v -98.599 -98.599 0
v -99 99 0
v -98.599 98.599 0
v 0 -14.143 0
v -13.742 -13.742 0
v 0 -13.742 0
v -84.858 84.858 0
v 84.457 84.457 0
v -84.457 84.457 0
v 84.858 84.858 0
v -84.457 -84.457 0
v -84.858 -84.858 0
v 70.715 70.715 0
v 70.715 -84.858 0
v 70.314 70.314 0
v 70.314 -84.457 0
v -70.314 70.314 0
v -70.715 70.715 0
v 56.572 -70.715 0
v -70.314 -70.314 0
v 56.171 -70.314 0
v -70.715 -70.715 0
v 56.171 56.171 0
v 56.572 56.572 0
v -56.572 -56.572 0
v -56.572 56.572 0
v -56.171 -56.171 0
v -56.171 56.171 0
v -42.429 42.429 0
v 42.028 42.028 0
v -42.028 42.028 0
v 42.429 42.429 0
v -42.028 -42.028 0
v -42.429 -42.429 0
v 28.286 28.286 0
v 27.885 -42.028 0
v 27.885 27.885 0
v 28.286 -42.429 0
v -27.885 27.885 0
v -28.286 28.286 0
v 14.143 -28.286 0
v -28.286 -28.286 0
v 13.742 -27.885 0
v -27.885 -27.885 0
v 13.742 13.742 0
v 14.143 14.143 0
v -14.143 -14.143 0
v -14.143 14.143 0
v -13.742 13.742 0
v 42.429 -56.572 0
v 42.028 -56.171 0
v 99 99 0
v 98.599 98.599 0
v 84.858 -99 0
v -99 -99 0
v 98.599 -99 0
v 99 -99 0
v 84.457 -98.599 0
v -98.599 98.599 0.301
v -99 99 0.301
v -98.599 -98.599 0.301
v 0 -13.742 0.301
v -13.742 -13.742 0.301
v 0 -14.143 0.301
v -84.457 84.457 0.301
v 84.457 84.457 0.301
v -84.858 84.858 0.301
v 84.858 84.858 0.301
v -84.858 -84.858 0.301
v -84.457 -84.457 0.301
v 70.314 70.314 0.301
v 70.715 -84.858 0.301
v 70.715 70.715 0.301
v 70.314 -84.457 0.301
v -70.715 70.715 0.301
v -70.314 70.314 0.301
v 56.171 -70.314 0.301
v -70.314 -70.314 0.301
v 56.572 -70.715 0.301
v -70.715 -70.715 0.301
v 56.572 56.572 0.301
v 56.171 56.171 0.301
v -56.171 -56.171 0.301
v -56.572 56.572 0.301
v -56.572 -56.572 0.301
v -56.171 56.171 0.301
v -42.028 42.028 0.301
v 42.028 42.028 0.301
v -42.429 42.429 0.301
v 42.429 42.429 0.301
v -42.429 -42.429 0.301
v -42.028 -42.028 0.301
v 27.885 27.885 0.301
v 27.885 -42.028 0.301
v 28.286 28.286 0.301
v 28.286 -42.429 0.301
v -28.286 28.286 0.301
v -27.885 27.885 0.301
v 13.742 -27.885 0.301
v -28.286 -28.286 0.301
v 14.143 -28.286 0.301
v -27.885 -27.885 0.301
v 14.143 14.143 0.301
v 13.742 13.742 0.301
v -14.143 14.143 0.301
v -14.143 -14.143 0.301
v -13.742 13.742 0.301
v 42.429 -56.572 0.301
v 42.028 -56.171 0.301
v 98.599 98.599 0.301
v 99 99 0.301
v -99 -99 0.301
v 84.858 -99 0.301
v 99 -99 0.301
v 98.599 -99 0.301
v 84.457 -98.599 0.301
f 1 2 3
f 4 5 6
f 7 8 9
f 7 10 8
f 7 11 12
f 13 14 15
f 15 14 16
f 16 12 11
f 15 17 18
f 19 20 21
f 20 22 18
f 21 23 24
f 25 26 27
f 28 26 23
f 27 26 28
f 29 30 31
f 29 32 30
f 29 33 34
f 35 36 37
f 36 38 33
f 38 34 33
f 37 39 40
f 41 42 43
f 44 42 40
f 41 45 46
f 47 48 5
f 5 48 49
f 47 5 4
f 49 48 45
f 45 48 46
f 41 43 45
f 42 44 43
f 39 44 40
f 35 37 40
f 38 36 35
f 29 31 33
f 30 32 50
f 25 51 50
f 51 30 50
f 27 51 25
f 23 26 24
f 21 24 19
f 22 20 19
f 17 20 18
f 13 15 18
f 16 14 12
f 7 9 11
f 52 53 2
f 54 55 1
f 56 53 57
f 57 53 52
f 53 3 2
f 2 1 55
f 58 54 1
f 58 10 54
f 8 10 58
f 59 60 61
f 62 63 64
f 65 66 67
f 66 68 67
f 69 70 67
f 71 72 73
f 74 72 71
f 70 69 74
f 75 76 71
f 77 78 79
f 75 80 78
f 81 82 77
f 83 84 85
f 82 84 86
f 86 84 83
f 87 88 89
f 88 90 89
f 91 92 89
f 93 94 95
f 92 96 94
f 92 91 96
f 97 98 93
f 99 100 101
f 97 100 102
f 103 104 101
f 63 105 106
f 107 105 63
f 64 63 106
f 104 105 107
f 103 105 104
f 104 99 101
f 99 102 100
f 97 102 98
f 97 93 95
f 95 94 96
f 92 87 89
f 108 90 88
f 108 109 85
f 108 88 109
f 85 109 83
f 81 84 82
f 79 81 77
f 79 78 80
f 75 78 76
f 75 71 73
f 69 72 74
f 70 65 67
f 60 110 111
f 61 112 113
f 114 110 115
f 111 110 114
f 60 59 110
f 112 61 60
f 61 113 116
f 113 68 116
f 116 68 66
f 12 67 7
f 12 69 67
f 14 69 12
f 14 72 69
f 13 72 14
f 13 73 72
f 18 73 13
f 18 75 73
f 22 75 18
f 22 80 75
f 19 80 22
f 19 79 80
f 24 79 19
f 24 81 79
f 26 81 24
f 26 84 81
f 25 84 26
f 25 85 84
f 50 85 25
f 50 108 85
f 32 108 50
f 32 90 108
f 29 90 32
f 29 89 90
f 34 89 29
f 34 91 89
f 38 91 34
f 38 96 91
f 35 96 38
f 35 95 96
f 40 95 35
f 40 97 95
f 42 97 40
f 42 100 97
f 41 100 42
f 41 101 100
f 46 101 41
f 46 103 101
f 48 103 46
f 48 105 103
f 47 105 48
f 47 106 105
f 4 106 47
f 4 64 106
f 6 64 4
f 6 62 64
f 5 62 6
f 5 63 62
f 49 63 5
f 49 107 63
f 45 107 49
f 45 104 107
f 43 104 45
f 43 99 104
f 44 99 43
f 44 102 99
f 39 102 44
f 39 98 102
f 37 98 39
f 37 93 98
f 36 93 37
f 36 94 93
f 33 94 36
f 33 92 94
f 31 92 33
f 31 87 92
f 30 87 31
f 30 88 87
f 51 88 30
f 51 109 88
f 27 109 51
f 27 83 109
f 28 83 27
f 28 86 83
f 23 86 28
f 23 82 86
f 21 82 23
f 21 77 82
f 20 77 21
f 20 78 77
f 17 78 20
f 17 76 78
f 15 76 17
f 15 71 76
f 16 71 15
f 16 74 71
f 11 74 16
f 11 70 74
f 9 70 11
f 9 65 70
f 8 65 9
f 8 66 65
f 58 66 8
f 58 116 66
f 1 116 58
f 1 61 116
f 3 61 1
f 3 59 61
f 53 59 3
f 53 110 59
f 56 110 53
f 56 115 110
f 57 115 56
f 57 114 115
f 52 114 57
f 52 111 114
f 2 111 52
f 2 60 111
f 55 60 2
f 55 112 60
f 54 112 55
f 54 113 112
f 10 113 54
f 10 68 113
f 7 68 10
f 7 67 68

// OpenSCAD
// Spiral squares bed level pattern
// One continuous square spiral of seven turns across 90% of a 220 x 220 mm bed.

include <../../src/bedlevelpattern.scad>;

// Parameters
bed_level_pattern_type = "spiral squares";
print_area_width = 220.001;
print_area_depth = 220.001;
line_width = 0.401;
line_height = 0.301;
fill_percentage = 90; // Range: [50:100]
concentric_ring_count = 7;
quality_value = 128;

$fn = quality_value;

// Generate the pattern
generate_bed_level_pattern(
  bed_level_pattern_type, print_area_width, print_area_depth, line_width, line_height,
  fill_percentage, concentric_ring_count=concentric_ring_count
);
